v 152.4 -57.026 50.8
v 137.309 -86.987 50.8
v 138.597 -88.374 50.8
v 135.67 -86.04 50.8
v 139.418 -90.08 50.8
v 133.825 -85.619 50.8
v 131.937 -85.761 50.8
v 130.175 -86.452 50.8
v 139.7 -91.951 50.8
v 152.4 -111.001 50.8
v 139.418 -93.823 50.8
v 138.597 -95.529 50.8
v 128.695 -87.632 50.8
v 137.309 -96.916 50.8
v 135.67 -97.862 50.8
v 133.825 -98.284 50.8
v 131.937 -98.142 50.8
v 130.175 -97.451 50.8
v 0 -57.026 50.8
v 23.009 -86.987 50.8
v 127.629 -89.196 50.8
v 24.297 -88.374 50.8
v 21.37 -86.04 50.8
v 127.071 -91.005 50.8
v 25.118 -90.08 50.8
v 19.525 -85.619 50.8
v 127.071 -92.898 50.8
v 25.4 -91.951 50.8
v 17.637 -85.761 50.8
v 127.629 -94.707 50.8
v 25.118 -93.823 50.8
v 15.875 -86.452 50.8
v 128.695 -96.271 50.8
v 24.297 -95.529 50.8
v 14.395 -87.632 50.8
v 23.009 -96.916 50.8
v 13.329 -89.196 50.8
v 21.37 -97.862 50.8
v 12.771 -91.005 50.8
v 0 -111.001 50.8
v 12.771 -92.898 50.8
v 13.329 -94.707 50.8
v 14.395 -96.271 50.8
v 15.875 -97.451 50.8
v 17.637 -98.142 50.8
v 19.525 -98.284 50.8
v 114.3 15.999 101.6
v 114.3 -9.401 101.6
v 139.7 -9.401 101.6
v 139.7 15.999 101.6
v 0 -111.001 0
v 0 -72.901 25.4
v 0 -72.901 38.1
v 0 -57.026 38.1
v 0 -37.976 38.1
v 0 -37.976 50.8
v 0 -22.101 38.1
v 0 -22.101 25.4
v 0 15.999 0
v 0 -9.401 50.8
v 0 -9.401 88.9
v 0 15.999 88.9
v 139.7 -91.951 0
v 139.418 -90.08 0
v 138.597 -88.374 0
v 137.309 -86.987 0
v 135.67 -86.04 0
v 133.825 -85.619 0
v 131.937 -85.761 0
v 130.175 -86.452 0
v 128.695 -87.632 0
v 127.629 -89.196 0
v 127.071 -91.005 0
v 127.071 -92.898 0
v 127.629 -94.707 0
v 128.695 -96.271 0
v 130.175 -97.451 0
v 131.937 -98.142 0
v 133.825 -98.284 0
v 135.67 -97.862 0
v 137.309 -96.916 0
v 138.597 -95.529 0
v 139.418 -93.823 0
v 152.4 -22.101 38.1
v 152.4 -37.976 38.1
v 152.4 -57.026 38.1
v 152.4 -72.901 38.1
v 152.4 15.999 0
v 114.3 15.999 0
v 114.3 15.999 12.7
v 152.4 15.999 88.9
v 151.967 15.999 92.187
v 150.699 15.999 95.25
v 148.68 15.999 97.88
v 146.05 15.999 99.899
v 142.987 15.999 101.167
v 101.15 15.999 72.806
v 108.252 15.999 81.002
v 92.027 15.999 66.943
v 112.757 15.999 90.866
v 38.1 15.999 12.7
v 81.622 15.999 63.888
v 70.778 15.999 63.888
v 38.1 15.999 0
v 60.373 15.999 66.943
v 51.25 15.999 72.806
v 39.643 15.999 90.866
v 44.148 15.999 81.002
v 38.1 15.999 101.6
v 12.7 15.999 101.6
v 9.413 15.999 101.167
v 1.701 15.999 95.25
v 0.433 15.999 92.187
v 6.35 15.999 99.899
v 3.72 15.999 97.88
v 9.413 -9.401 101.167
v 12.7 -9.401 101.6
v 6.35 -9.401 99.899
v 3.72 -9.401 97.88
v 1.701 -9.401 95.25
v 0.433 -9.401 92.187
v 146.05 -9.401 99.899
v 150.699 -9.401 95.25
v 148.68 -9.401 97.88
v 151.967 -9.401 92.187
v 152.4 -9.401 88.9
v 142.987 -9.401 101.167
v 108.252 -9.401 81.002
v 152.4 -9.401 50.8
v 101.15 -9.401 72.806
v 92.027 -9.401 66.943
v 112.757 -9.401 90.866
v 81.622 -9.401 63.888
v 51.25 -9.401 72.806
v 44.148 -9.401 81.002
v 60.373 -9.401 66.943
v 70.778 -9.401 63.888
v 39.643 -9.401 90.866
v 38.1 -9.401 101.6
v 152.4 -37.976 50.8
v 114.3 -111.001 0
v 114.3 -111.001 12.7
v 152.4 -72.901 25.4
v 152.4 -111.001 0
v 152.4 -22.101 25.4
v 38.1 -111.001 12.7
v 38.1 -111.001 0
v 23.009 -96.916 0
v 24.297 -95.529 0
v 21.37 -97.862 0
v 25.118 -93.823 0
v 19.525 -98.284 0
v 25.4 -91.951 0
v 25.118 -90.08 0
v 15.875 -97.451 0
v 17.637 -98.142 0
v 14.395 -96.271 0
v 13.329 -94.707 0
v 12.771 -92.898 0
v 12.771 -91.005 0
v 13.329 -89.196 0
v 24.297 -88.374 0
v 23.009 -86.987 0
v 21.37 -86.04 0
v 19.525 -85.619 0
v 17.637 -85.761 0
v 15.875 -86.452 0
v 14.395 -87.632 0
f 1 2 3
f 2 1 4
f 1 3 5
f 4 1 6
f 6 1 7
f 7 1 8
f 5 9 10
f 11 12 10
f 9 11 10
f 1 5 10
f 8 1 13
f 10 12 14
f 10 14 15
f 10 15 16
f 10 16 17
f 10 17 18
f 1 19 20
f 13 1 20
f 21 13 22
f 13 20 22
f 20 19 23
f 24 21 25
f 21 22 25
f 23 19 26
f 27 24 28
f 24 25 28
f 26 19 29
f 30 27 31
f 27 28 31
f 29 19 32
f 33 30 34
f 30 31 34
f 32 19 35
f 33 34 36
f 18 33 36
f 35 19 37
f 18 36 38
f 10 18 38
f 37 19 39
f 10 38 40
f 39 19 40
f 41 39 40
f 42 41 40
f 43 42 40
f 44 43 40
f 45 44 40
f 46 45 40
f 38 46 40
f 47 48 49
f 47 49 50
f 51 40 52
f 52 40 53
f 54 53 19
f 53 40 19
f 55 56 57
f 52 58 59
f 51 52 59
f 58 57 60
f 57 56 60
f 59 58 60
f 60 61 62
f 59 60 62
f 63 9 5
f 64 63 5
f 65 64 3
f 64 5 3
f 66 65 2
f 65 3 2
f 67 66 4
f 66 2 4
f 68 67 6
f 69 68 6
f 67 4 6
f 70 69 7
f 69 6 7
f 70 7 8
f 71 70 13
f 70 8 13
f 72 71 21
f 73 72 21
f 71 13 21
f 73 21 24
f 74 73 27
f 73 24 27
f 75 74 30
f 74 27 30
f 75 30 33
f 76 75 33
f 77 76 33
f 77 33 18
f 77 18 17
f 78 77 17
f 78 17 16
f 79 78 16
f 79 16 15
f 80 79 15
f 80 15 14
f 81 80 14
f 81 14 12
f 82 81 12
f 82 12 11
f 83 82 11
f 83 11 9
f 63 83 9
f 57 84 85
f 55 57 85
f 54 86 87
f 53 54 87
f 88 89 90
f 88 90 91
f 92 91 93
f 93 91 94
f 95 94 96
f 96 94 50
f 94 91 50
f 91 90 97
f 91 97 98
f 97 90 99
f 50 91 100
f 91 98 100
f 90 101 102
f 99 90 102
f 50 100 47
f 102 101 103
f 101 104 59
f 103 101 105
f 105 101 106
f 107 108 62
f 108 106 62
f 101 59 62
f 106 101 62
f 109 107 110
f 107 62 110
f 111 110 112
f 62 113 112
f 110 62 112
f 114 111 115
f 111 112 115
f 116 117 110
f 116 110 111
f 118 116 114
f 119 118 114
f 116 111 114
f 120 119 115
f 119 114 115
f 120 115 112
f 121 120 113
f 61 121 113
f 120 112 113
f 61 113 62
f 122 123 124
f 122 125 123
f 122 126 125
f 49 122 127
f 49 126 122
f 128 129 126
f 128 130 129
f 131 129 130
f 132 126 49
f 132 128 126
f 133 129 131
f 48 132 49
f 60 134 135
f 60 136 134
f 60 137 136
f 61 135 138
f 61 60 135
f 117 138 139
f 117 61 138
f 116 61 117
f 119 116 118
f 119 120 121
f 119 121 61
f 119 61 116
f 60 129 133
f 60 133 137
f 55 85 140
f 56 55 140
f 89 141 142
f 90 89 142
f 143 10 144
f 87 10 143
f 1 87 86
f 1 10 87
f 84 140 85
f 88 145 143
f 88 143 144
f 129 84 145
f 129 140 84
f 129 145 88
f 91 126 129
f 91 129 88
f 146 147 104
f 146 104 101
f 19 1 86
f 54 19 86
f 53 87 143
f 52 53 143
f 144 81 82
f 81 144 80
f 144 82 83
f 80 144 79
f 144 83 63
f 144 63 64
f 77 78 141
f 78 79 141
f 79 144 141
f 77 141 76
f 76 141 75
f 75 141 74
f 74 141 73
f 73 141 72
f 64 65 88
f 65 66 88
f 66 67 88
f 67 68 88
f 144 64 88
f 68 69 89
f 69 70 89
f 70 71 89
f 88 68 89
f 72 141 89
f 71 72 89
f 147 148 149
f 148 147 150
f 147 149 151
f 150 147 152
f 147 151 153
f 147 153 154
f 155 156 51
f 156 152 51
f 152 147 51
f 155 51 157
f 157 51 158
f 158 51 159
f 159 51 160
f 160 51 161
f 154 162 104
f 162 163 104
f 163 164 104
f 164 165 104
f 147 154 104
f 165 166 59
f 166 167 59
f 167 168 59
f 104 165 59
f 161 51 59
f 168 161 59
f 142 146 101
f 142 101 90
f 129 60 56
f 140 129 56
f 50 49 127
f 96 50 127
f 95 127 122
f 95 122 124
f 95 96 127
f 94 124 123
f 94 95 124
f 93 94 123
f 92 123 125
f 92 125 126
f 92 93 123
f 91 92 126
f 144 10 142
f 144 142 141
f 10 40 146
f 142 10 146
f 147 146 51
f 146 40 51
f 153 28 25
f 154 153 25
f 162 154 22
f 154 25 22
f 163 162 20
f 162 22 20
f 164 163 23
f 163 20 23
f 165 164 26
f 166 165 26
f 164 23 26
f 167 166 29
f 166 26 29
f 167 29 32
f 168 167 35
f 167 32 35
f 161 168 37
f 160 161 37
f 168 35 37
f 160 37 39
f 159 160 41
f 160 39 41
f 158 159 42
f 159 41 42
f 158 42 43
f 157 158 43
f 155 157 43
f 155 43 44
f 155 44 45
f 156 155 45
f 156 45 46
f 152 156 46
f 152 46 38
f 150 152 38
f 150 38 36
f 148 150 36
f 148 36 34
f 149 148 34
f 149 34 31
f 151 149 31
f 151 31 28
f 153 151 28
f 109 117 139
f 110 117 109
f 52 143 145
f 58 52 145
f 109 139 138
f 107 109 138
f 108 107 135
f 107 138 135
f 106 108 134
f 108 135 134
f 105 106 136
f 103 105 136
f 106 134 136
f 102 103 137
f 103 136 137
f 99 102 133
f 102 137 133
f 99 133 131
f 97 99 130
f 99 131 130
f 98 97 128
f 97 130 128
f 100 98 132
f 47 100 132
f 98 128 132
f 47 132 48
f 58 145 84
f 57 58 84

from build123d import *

# Parameters (mm, degrees)
F0_W      = 25.4
F0_H      = 50.8
F1_DEPTH  = 152.4
F2_R      = 12.7
F4_DEPTH  = 152.401
F5_W      = 76.2
F5_H      = 12.7
F6_DEPTH  = 127.001
F7_R      = 6.35
F8_DEPTH  = 50.801
F9_R      = 38.1
F10_DEPTH = 25.401


with BuildPart() as f1:
    # F0 (on Right) → F1 (new body)
    with BuildSketch(Plane.YZ):
        Polygon((-111.00142, 50.8), (-111.00142, 0), (15.99858, 0), (15.99858, 50.8), (-9.40142, 50.8), align=None)
        with Locations((3.29858, 76.2)):
            Rectangle(F0_W, F0_H)
    extrude(amount=F1_DEPTH)

    # F2
    f2_edges = [f1.edges().sort_by_distance(p)[0] for p in [
        (152.4, 3.29858, 101.6),
        (0, 3.29858, 101.6),
    ]]
    fillet(f2_edges, radius=F2_R)

    # F3 (on face) → F4 (cut, through all)
    with BuildSketch(Plane.YZ.offset(152.4)):
        Polygon((-37.97642, 50.8), (-57.02642, 50.8), (-57.02642, 38.1), (-72.90142, 38.1), (-72.90142, 25.4), (-22.10142, 25.4), (-22.10142, 38.1), (-37.97642, 38.1), align=None)
    extrude(amount=-F4_DEPTH, mode=Mode.SUBTRACT)

    # F5 (on face) → F6 (cut, through all)
    with BuildSketch(Plane.XZ.offset(111.00142)):
        with Locations((76.2, 6.35)):
            Rectangle(F5_W, F5_H)
    extrude(amount=-F6_DEPTH, mode=Mode.SUBTRACT)

    # F7 (on face) → F8 (cut, through all)
    with BuildSketch(Plane.XY.offset(50.8)):
        with Locations((19.05, -91.95142)):
            Circle(F7_R)
        with Locations((133.35, -91.95142)):
            Circle(F7_R)
    extrude(amount=-F8_DEPTH, mode=Mode.SUBTRACT)

    # F9 (on face) → F10 (cut, through all)
    with BuildSketch(Plane.XZ.offset(9.40142)):
        with Locations((76.2, 101.6)):
            Circle(F9_R)
    extrude(amount=-F10_DEPTH, mode=Mode.SUBTRACT)


solid = f1.part
